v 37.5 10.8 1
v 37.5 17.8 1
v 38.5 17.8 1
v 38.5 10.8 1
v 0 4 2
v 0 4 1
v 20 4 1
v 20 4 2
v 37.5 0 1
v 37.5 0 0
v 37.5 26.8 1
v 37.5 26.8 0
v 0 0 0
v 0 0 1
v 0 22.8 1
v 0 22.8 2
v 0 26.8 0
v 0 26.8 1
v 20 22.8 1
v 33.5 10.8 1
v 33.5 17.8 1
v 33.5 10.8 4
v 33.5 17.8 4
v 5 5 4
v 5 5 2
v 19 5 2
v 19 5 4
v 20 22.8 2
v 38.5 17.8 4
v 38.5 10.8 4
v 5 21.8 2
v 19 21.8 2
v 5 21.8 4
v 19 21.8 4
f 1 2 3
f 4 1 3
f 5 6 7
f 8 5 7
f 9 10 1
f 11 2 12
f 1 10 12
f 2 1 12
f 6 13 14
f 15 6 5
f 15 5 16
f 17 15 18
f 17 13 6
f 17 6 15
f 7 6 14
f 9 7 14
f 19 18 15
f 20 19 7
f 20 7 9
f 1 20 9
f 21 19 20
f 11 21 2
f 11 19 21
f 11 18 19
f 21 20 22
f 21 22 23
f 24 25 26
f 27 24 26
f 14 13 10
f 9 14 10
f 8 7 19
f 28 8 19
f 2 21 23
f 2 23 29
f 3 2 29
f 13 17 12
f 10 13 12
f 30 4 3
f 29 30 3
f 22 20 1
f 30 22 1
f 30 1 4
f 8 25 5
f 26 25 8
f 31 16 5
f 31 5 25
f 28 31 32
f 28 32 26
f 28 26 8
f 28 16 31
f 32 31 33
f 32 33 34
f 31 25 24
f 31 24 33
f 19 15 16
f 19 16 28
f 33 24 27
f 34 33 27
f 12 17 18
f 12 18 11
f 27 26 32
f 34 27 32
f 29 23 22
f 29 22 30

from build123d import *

# Parameters (mm, degrees)
F0_W     = 37.5
F0_H     = 26.8
F1_DEPTH = 1
F2_W     = 5
F2_H     = 7
F3_DEPTH = 3
F4_W     = 20
F4_H     = 18.8
F5_DEPTH = 1
F6_W     = 14
F6_H     = 16.8
F7_DEPTH = 2
F8_DEPTH = 2


with BuildPart() as f1:
    # F0 (on Top) → F1 (new body)
    with BuildSketch(Plane.XY):
        with Locations((18.75, 13.4)):
            Rectangle(F0_W, F0_H)
    extrude(amount=F1_DEPTH)

    # F2 (on face) → F3 (join)
    with BuildSketch(Plane.XY.offset(1)):
        with Locations((36, 14.3)):
            Rectangle(F2_W, F2_H)
    extrude(amount=F3_DEPTH)

    # F4 (on face) → F5 (join)
    with BuildSketch(Plane.XY.offset(1)):
        with Locations((10, 13.4)):
            Rectangle(F4_W, F4_H)
    extrude(amount=F5_DEPTH)

    # F6 (on face) → F7 (join)
    with BuildSketch(Plane.XY.offset(2)):
        with Locations((12, 13.4)):
            Rectangle(F6_W, F6_H)
    extrude(amount=F7_DEPTH)

    # F6 (on face) → F8 (join)
    with BuildSketch(Plane.XY.offset(2)):
        with Locations((12, 13.4)):
            Rectangle(F6_W, F6_H)
    extrude(amount=F8_DEPTH)


solid = f1.part
